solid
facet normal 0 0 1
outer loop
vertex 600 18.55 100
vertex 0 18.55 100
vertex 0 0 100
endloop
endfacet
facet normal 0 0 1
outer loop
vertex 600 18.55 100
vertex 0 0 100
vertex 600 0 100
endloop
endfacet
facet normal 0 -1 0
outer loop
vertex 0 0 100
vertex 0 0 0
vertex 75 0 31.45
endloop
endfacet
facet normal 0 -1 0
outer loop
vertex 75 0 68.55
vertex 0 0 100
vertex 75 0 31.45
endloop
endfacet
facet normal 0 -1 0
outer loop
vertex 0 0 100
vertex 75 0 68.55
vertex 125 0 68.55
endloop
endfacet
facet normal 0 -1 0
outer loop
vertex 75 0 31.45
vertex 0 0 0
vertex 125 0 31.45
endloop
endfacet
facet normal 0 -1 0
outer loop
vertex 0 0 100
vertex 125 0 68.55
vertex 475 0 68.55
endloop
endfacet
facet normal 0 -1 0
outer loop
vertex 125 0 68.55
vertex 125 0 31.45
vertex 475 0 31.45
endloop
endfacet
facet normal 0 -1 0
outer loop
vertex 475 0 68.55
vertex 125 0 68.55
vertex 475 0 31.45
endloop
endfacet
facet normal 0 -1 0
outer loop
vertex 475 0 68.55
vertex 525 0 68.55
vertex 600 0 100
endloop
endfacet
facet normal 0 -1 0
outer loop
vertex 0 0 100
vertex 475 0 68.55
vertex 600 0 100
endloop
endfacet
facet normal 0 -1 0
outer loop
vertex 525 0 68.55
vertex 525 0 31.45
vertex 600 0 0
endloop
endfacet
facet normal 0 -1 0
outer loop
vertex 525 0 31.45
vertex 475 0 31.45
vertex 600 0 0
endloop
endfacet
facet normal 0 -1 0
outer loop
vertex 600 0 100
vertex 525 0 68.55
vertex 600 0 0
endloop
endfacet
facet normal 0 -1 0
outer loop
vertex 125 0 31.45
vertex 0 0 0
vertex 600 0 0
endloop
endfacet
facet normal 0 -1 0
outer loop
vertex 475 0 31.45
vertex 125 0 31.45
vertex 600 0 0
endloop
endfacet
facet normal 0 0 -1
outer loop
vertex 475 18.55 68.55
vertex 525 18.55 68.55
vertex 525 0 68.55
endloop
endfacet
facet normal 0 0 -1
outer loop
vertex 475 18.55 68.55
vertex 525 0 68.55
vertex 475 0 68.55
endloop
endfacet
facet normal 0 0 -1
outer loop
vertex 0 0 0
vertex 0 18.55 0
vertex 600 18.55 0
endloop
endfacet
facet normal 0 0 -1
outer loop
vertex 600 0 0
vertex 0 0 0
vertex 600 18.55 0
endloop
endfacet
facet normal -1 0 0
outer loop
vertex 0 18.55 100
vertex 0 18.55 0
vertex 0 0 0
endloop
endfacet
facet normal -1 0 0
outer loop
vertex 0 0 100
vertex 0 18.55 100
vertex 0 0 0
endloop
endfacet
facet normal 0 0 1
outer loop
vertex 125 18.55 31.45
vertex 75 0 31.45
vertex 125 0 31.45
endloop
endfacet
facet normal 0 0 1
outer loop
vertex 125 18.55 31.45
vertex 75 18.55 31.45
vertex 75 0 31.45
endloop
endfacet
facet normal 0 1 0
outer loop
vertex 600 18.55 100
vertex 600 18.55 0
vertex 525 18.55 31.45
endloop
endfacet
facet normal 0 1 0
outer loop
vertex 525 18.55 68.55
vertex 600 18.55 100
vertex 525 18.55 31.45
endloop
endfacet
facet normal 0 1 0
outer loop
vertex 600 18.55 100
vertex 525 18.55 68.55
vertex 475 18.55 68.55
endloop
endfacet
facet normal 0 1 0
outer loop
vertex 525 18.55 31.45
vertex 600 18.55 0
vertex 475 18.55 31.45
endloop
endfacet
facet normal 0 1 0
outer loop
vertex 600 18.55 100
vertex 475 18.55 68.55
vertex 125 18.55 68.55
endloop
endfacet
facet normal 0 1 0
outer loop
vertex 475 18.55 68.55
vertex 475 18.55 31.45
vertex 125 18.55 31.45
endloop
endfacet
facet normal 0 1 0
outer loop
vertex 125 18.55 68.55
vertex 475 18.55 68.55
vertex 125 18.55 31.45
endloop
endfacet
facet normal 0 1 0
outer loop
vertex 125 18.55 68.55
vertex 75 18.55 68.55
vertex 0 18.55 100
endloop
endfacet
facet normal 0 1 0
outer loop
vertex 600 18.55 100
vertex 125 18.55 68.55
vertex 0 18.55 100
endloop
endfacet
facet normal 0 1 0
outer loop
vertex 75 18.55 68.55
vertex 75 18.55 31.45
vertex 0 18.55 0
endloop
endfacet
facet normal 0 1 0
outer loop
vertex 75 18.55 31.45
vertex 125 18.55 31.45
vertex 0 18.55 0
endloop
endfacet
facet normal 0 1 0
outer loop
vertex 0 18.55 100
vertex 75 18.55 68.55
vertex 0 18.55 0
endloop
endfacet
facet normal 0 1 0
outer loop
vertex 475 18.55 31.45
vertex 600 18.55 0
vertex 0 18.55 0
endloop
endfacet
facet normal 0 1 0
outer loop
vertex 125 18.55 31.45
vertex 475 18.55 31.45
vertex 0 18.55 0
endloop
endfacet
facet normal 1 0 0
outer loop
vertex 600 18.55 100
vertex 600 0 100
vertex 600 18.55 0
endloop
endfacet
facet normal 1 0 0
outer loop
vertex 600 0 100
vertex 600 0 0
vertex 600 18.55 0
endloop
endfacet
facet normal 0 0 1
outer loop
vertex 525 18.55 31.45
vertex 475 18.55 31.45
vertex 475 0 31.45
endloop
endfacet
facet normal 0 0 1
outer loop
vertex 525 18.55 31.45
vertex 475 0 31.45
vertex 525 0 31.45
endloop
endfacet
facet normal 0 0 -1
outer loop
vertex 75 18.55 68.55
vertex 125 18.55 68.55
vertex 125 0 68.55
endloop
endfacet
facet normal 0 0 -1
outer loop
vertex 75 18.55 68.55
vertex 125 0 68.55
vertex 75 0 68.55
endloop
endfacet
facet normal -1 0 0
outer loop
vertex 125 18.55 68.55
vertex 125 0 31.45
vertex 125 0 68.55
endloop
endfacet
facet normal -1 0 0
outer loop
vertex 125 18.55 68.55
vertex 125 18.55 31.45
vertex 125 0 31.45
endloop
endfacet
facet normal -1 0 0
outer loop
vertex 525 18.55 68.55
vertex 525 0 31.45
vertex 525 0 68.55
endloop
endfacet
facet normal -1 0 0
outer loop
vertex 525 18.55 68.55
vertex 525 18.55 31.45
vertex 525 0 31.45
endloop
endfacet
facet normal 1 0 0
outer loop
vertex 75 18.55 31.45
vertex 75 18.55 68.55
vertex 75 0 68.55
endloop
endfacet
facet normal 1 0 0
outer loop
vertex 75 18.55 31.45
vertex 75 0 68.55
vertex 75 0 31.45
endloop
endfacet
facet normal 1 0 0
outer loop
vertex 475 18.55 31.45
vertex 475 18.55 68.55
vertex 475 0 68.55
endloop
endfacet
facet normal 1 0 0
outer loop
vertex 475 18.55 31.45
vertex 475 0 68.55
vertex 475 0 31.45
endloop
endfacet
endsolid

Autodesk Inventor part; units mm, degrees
ref_plane "YZ Plane" through (0, 0, 0) normal (1, 0, 0) x (0, 1, 0)
ref_plane "XZ Plane" through (0, 0, 0) normal (0, 1, 0) x (-1, 0, 0)
ref_plane "XY Plane" through (0, 0, 0) normal (0, 0, 1) x (1, 0, 0)
sketch "Sketch1" plane through (0, 0, 0) normal (0, 0, 1) x (1, 0, 0)
  line L0 (0, 0) -> (600, 0)
  line L1 (600, 0) -> (600, 18.55)
  line L2 (600, 18.55) -> (0, 18.55)
  line L3 (0, 18.55) -> (0, 0)
  dimension "d0" = 600
  dimension "d1" = 18.55
extrude "Extrusion1" add sketch "Sketch1" along normal blind 100
sketch "Sketch2" plane through (0, 18.55, 0) normal (0, 1, 0) x (1, 0, 0)
  line L0 (75, -31.45) -> (125, -31.45)
  line L1 (125, -31.45) -> (125, -68.55)
  line L2 (125, -68.55) -> (75, -68.55)
  line L3 (75, -68.55) -> (75, -31.45)
  line L4 (475, -31.45) -> (525, -31.45)
  line L5 (525, -31.45) -> (525, -68.55)
  line L6 (525, -68.55) -> (475, -68.55)
  line L7 (475, -68.55) -> (475, -31.45)
  line L8 (0, 0) -> (0, -100) projected
  line L9 (600, 0) -> (600, -100) projected
  line L10 (100, -31.45) -> (100, 0) construction
  line L11 (0, 0) -> (600, 0) projected
  line L12 (100, -68.55) -> (100, -100) construction
  line L13 (0, -100) -> (600, -100) projected
  dimension "d4" = 50
  dimension "d5" = 75
  dimension "d6" = 75
  dimension "d7" = 37.1
  dimension "d8" = 50
extrude "Extrusion2" cut sketch "Sketch2" against normal blind 100 contours L0 L1 L2 L3 | L4 L5 L6 L7
properties part number "table_bottont"
